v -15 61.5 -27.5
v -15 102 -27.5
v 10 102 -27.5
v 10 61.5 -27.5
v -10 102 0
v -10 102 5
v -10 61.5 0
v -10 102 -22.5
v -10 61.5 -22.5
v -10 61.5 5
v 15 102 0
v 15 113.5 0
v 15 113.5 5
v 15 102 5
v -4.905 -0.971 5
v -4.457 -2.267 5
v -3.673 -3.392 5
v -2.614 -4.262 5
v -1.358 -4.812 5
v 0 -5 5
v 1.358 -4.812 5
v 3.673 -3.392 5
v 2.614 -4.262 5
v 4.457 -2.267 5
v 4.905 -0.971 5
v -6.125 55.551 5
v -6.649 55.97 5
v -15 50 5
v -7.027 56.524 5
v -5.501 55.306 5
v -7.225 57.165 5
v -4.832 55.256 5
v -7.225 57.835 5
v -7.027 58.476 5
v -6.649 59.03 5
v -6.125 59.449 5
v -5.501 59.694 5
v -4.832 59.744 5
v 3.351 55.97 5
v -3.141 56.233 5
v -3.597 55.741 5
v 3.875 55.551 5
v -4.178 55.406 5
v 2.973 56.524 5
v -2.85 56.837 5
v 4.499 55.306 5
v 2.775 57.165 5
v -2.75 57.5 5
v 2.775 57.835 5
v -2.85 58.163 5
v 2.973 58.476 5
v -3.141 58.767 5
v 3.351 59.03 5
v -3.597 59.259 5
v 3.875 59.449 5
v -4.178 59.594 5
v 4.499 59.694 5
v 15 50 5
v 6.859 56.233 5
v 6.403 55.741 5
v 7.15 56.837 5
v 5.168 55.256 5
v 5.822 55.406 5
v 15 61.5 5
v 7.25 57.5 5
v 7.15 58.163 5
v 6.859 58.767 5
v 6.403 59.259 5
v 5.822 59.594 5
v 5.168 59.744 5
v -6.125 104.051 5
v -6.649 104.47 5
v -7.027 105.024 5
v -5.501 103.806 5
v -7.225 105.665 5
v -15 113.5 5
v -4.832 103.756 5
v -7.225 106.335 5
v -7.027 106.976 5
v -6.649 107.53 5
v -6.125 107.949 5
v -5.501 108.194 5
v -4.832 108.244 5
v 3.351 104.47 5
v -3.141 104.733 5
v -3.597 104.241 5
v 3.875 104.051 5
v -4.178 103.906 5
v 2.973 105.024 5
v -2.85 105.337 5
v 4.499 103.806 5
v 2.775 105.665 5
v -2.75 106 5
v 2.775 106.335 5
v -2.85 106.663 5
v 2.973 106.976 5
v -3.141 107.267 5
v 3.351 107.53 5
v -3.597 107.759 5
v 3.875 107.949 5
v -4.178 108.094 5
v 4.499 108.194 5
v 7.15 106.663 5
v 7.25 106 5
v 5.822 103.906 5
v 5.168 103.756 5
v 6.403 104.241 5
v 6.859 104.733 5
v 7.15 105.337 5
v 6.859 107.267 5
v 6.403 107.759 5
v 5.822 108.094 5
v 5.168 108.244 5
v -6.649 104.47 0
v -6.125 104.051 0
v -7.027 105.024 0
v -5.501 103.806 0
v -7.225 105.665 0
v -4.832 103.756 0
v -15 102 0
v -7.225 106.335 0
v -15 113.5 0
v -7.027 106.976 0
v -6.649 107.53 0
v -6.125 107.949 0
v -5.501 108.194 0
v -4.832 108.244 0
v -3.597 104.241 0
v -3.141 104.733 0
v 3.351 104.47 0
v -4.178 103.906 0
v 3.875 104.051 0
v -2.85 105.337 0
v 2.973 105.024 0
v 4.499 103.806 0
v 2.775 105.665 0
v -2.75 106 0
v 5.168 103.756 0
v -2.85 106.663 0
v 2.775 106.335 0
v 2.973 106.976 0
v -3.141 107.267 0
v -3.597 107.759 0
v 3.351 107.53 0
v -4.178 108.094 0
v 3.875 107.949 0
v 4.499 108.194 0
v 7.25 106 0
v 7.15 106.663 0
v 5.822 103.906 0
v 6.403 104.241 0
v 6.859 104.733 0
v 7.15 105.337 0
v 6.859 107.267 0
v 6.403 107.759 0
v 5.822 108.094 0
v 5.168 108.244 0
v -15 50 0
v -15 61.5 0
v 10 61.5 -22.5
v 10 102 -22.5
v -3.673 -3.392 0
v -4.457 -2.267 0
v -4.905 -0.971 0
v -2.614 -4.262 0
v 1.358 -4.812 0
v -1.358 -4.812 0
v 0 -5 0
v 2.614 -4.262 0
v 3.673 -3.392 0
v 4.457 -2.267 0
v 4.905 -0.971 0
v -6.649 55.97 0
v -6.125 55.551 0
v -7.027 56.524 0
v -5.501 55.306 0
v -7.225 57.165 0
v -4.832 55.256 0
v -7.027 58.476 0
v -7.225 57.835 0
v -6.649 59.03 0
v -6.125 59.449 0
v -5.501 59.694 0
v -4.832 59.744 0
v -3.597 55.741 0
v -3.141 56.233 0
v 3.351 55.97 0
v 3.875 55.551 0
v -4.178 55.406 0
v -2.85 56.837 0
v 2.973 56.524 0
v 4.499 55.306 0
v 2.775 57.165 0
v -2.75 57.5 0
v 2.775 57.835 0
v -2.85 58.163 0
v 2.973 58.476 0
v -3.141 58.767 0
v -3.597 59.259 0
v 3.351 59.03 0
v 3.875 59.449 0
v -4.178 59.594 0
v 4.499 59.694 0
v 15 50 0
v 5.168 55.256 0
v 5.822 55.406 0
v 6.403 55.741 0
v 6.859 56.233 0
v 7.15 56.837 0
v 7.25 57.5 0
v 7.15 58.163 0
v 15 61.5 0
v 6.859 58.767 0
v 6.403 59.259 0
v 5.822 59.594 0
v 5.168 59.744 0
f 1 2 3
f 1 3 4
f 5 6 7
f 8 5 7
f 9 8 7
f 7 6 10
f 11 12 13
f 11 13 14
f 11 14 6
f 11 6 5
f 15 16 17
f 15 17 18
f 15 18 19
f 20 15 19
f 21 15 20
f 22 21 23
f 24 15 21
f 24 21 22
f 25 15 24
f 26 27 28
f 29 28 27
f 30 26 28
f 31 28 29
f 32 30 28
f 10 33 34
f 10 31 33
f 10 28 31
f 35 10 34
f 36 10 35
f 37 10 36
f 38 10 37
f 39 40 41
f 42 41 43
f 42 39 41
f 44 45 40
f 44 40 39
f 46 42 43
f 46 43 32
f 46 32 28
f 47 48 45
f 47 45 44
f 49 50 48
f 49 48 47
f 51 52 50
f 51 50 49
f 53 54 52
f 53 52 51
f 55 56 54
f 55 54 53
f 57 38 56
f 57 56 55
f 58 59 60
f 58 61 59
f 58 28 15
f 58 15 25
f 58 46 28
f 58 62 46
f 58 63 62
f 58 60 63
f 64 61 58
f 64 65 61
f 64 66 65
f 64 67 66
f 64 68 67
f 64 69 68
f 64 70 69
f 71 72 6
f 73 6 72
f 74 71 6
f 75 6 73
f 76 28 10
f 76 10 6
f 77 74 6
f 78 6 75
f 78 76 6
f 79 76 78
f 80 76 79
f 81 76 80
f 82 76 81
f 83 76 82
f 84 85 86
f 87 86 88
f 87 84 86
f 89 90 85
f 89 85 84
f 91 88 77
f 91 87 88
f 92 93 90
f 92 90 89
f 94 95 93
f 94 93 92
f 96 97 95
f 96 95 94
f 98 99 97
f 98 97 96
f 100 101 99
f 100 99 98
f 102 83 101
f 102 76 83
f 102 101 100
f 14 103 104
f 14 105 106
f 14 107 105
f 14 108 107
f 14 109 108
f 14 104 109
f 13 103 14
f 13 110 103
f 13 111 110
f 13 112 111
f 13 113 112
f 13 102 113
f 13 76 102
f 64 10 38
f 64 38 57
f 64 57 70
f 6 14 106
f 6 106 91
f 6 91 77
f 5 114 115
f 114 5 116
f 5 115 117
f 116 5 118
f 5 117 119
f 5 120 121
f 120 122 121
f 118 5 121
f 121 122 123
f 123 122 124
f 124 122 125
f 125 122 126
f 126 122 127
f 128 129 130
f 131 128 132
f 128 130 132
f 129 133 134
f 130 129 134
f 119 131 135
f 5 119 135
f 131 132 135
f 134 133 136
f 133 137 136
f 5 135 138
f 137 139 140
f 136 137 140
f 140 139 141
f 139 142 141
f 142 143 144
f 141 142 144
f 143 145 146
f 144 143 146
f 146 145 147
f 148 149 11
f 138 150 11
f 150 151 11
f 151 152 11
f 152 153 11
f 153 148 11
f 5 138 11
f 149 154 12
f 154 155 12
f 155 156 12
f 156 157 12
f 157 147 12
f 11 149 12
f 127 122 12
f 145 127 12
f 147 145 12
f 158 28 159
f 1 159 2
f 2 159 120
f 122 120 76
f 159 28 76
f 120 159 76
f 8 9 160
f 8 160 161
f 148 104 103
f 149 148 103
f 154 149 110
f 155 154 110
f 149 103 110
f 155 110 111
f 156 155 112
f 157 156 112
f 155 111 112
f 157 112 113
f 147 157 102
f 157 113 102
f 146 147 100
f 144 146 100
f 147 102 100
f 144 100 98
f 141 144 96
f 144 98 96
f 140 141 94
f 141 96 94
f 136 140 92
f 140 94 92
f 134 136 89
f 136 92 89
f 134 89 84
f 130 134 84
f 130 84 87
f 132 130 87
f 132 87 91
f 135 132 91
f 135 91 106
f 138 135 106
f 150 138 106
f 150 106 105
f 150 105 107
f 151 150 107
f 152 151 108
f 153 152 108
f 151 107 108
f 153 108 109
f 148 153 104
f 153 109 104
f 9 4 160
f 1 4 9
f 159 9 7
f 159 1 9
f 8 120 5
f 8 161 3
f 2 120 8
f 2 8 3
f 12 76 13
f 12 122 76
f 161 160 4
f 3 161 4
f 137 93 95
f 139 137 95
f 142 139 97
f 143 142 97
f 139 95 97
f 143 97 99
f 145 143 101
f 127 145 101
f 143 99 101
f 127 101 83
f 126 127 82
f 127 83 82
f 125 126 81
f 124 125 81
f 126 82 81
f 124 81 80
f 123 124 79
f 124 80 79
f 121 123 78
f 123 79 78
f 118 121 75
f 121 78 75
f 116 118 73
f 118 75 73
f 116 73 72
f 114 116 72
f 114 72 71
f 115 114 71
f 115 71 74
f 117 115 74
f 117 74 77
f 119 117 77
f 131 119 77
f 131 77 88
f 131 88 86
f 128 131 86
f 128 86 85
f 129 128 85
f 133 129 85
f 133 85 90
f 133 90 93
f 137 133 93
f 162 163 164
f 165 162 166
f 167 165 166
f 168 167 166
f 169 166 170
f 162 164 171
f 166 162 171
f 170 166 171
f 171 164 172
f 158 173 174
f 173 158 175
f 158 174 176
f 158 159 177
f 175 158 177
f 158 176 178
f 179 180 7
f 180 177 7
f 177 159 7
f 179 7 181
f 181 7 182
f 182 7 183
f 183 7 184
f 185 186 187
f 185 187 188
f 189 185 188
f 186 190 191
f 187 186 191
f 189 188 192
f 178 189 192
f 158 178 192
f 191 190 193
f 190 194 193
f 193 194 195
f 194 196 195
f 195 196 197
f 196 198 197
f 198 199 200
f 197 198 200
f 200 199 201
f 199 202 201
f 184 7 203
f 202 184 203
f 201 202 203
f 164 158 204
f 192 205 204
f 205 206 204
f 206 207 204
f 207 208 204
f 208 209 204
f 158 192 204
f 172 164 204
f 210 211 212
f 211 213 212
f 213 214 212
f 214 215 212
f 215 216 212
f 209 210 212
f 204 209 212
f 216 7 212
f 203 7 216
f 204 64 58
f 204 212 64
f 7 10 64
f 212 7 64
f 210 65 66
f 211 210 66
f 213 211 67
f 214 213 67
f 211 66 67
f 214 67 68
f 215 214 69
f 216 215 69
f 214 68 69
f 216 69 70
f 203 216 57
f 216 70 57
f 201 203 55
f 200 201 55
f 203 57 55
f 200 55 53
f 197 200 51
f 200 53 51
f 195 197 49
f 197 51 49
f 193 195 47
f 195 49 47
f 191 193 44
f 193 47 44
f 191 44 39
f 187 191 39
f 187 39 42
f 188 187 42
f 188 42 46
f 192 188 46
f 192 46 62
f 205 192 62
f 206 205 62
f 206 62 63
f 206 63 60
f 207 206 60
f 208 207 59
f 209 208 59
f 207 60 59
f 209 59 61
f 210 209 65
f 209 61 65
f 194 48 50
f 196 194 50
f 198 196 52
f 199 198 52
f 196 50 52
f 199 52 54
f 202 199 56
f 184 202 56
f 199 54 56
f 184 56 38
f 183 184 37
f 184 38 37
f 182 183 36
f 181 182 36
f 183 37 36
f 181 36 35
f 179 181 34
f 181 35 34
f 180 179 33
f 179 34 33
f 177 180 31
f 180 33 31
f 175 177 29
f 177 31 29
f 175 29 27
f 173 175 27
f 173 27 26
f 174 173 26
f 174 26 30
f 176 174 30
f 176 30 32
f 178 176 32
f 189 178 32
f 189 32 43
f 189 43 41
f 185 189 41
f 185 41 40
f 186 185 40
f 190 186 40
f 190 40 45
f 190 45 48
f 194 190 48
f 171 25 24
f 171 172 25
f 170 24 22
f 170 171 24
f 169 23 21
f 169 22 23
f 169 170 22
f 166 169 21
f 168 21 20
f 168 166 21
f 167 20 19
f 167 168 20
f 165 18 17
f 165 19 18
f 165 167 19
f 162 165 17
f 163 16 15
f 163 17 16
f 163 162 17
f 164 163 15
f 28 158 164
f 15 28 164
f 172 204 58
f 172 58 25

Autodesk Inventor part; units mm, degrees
ref_plane "YZ Plane" through (0, 0, 0) normal (1, 0, 0) x (0, 1, 0)
ref_plane "XZ Plane" through (0, 0, 0) normal (0, 1, 0) x (-1, 0, 0)
ref_plane "XY Plane" through (0, 0, 0) normal (0, 0, 1) x (1, 0, 0)
sketch "Sketch1" plane through (0, 0, 0) normal (0, 0, 1) x (1, 0, 0)
  point P0 (0, 0)
sketch "Sketch2" plane through (0, 0, 0) normal (0, 0, 1) x (1, 0, 0)
  line L0 (-15, 113.5) -> (15, 113.5)
  line L1 (15, 113.5) -> (15, 50)
  line L2 (15, 50) -> (-15, 50) construction
  line L3 (-15, 50) -> (-15, 113.5)
  circle A0 centre (0, 0) radius 5 construction
  line L4 (-15, 50) -> (-4.9047, -0.9714)
  line L5 (15, 50) -> (4.9047, -0.9714)
  arc A1 (-4.9047, -0.9714) -> (4.9047, -0.9714) centre (0, 0) ccw
  point P0 (0, 50)
  dimension "d0" = 30
  dimension "d1" = 63.5
  dimension "d2" = 10
  dimension "d3" = 50
extrude "Extrusion1" add sketch "Sketch2" along normal blind 5
sketch "Sketch3" plane through (0, 0, 5) normal (0, 0, 1) x (1, 0, 0)
  line L0 (-10, 108.5) -> (10, 108.5) construction
  line L1 (10, 108.5) -> (10, 55) construction
  line L2 (10, 55) -> (-10, 55) construction
  line L3 (-10, 55) -> (-10, 108.5) construction
  line L4 (15, 113.5) -> (-15, 113.5) construction
  circle A0 centre (-5, 106) radius 2.25
  circle A1 centre (5, 106) radius 2.25
  circle A2 centre (-5, 57.5) radius 2.25
  circle A3 centre (5, 57.5) radius 2.25
  line L5 (-10, 61.5) -> (10, 61.5)
  line L6 (10, 61.5) -> (10, 102)
  line L7 (10, 102) -> (-10, 102)
  line L8 (-10, 102) -> (-10, 61.5)
  line L9 (0, 108.5) -> (0, 55) construction
  point P0 (0, 0)
  point P1 (-10, 81.75)
  point P2 (10, 81.75)
  point P3 (0, 81.75)
  dimension "d6" = 20
  dimension "d7" = 53.5
  dimension "d8" = 5
  dimension "d9" = 4.5
  dimension "d11" = 2.75
  dimension "d12" = 2.5
  dimension "d13" = 2.75
  dimension "d14" = 2.5
  dimension "d15" = 40.5
extrude "Extrusion2" cut sketch "Sketch3" against normal up to next
sketch "Sketch4" plane through (15, 50, 0) normal (1, 0, 0) x (0, 0, -1)
  line L0 (-5, 52) -> (0, 52)
  line L1 (0, 52) -> (0, 11.5)
  line L2 (0, 11.5) -> (-5, 11.5)
  line L3 (-5, 11.5) -> (-5, 52)
  line L4 (-5, 52) -> (0, 52) projected
  line L5 (-5, 11.5) -> (0, 11.5) projected
  line L6 (0, 63.5) -> (0, 0) projected
  point P0 (0, -50)
  point P1 (-2.5, 52)
  point P2 (-2.5, 11.5)
  point P3 (0, 31.75)
extrude "Extrusion3" cut sketch "Sketch4" against normal up to surface (5 mm away)
sketch "Sketch8" plane through (0, 0, 0) normal (0, 0, -1) x (-1, 0, 0)
  line L0 (15, 102) -> (10, 102)
  line L1 (10, 102) -> (10, 61.5)
  line L2 (10, 61.5) -> (15, 61.5)
  line L3 (15, 61.5) -> (15, 102)
  line L4 (15, 50) -> (15, 113.5) projected
  line L5 (10, 102) -> (10, 61.5) projected
  point P0 (0, 0)
  point P1 (15, 81.75)
  point P2 (10, 81.75)
  point P3 (12.5, 61.5)
  point P4 (12.5, 102)
extrude "Extrusion6" add sketch "Sketch8" along normal blind 27.5
sketch "Sketch9" plane through (-10, 61.5, 5) normal (1, 0, 0) x (0, 0, -1)
  line L0 (27.5, 40.5) -> (32.5, 40.5)
  line L1 (32.5, 40.5) -> (32.5, 0)
  line L2 (32.5, 0) -> (27.5, 0)
  line L3 (27.5, 0) -> (27.5, 40.5)
  line L4 (32.5, 40.5) -> (32.5, 0) projected
  line L5 (5, 40.5) -> (32.5, 40.5) projected
  line L6 (5, 0) -> (32.5, 0) projected
  point P0 (5, -61.5)
  point P1 (32.5, 20.25)
  point P2 (30, 40.5)
  point P3 (30, 0)
  dimension "d27" = 5
extrude "Extrusion7" add sketch "Sketch9" along normal blind 20
equation "\"d0\" = s_depth + 2 * b_mat_thickness"
equation "\"d1\" = 2 * s_land + s_width + 2 * b_mat_thickness"
equation "\"d4\" = b_mat_thickness"
equation "\"d6\" = s_depth"
equation "\"d7\" = s_width + 2 * s_land"
equation "\"d8\" = b_mat_thickness"
equation "\"d9\" = s_hole_dia"
equation "\"d11\" = s_hole_side_dist"
equation "\"d12\" = s_hole_front_dist"
equation "\"d13\" = s_hole_side_dist"
equation "\"d14\" = s_hole_front_dist"
equation "\"d15\" = s_width"
equation "\"d16\" = b_mat_thickness"
equation "\"d25\" = -s_land_dist_top + s_height - s_land_thickness"
equation "\"d27\" = b_mat_thickness"
equation "\"d28\" = s_depth"
equation "\"s_depth\" = 20"
equation "\"b_mat_thickness\" = 5"
equation "\"s_land\" = 6.5"
equation "\"s_width\" = 40.5"
equation "\"s_hole_dia\" = 4.5"
equation "\"s_hole_side_dist\" = 2.75"
equation "\"s_hole_front_dist\" = 2.5"
equation "\"s_land_dist_top\" = 8"
equation "\"s_height\" = 38"
equation "\"s_land_thickness\" = 2.5"
properties part number "Lower_leg"
